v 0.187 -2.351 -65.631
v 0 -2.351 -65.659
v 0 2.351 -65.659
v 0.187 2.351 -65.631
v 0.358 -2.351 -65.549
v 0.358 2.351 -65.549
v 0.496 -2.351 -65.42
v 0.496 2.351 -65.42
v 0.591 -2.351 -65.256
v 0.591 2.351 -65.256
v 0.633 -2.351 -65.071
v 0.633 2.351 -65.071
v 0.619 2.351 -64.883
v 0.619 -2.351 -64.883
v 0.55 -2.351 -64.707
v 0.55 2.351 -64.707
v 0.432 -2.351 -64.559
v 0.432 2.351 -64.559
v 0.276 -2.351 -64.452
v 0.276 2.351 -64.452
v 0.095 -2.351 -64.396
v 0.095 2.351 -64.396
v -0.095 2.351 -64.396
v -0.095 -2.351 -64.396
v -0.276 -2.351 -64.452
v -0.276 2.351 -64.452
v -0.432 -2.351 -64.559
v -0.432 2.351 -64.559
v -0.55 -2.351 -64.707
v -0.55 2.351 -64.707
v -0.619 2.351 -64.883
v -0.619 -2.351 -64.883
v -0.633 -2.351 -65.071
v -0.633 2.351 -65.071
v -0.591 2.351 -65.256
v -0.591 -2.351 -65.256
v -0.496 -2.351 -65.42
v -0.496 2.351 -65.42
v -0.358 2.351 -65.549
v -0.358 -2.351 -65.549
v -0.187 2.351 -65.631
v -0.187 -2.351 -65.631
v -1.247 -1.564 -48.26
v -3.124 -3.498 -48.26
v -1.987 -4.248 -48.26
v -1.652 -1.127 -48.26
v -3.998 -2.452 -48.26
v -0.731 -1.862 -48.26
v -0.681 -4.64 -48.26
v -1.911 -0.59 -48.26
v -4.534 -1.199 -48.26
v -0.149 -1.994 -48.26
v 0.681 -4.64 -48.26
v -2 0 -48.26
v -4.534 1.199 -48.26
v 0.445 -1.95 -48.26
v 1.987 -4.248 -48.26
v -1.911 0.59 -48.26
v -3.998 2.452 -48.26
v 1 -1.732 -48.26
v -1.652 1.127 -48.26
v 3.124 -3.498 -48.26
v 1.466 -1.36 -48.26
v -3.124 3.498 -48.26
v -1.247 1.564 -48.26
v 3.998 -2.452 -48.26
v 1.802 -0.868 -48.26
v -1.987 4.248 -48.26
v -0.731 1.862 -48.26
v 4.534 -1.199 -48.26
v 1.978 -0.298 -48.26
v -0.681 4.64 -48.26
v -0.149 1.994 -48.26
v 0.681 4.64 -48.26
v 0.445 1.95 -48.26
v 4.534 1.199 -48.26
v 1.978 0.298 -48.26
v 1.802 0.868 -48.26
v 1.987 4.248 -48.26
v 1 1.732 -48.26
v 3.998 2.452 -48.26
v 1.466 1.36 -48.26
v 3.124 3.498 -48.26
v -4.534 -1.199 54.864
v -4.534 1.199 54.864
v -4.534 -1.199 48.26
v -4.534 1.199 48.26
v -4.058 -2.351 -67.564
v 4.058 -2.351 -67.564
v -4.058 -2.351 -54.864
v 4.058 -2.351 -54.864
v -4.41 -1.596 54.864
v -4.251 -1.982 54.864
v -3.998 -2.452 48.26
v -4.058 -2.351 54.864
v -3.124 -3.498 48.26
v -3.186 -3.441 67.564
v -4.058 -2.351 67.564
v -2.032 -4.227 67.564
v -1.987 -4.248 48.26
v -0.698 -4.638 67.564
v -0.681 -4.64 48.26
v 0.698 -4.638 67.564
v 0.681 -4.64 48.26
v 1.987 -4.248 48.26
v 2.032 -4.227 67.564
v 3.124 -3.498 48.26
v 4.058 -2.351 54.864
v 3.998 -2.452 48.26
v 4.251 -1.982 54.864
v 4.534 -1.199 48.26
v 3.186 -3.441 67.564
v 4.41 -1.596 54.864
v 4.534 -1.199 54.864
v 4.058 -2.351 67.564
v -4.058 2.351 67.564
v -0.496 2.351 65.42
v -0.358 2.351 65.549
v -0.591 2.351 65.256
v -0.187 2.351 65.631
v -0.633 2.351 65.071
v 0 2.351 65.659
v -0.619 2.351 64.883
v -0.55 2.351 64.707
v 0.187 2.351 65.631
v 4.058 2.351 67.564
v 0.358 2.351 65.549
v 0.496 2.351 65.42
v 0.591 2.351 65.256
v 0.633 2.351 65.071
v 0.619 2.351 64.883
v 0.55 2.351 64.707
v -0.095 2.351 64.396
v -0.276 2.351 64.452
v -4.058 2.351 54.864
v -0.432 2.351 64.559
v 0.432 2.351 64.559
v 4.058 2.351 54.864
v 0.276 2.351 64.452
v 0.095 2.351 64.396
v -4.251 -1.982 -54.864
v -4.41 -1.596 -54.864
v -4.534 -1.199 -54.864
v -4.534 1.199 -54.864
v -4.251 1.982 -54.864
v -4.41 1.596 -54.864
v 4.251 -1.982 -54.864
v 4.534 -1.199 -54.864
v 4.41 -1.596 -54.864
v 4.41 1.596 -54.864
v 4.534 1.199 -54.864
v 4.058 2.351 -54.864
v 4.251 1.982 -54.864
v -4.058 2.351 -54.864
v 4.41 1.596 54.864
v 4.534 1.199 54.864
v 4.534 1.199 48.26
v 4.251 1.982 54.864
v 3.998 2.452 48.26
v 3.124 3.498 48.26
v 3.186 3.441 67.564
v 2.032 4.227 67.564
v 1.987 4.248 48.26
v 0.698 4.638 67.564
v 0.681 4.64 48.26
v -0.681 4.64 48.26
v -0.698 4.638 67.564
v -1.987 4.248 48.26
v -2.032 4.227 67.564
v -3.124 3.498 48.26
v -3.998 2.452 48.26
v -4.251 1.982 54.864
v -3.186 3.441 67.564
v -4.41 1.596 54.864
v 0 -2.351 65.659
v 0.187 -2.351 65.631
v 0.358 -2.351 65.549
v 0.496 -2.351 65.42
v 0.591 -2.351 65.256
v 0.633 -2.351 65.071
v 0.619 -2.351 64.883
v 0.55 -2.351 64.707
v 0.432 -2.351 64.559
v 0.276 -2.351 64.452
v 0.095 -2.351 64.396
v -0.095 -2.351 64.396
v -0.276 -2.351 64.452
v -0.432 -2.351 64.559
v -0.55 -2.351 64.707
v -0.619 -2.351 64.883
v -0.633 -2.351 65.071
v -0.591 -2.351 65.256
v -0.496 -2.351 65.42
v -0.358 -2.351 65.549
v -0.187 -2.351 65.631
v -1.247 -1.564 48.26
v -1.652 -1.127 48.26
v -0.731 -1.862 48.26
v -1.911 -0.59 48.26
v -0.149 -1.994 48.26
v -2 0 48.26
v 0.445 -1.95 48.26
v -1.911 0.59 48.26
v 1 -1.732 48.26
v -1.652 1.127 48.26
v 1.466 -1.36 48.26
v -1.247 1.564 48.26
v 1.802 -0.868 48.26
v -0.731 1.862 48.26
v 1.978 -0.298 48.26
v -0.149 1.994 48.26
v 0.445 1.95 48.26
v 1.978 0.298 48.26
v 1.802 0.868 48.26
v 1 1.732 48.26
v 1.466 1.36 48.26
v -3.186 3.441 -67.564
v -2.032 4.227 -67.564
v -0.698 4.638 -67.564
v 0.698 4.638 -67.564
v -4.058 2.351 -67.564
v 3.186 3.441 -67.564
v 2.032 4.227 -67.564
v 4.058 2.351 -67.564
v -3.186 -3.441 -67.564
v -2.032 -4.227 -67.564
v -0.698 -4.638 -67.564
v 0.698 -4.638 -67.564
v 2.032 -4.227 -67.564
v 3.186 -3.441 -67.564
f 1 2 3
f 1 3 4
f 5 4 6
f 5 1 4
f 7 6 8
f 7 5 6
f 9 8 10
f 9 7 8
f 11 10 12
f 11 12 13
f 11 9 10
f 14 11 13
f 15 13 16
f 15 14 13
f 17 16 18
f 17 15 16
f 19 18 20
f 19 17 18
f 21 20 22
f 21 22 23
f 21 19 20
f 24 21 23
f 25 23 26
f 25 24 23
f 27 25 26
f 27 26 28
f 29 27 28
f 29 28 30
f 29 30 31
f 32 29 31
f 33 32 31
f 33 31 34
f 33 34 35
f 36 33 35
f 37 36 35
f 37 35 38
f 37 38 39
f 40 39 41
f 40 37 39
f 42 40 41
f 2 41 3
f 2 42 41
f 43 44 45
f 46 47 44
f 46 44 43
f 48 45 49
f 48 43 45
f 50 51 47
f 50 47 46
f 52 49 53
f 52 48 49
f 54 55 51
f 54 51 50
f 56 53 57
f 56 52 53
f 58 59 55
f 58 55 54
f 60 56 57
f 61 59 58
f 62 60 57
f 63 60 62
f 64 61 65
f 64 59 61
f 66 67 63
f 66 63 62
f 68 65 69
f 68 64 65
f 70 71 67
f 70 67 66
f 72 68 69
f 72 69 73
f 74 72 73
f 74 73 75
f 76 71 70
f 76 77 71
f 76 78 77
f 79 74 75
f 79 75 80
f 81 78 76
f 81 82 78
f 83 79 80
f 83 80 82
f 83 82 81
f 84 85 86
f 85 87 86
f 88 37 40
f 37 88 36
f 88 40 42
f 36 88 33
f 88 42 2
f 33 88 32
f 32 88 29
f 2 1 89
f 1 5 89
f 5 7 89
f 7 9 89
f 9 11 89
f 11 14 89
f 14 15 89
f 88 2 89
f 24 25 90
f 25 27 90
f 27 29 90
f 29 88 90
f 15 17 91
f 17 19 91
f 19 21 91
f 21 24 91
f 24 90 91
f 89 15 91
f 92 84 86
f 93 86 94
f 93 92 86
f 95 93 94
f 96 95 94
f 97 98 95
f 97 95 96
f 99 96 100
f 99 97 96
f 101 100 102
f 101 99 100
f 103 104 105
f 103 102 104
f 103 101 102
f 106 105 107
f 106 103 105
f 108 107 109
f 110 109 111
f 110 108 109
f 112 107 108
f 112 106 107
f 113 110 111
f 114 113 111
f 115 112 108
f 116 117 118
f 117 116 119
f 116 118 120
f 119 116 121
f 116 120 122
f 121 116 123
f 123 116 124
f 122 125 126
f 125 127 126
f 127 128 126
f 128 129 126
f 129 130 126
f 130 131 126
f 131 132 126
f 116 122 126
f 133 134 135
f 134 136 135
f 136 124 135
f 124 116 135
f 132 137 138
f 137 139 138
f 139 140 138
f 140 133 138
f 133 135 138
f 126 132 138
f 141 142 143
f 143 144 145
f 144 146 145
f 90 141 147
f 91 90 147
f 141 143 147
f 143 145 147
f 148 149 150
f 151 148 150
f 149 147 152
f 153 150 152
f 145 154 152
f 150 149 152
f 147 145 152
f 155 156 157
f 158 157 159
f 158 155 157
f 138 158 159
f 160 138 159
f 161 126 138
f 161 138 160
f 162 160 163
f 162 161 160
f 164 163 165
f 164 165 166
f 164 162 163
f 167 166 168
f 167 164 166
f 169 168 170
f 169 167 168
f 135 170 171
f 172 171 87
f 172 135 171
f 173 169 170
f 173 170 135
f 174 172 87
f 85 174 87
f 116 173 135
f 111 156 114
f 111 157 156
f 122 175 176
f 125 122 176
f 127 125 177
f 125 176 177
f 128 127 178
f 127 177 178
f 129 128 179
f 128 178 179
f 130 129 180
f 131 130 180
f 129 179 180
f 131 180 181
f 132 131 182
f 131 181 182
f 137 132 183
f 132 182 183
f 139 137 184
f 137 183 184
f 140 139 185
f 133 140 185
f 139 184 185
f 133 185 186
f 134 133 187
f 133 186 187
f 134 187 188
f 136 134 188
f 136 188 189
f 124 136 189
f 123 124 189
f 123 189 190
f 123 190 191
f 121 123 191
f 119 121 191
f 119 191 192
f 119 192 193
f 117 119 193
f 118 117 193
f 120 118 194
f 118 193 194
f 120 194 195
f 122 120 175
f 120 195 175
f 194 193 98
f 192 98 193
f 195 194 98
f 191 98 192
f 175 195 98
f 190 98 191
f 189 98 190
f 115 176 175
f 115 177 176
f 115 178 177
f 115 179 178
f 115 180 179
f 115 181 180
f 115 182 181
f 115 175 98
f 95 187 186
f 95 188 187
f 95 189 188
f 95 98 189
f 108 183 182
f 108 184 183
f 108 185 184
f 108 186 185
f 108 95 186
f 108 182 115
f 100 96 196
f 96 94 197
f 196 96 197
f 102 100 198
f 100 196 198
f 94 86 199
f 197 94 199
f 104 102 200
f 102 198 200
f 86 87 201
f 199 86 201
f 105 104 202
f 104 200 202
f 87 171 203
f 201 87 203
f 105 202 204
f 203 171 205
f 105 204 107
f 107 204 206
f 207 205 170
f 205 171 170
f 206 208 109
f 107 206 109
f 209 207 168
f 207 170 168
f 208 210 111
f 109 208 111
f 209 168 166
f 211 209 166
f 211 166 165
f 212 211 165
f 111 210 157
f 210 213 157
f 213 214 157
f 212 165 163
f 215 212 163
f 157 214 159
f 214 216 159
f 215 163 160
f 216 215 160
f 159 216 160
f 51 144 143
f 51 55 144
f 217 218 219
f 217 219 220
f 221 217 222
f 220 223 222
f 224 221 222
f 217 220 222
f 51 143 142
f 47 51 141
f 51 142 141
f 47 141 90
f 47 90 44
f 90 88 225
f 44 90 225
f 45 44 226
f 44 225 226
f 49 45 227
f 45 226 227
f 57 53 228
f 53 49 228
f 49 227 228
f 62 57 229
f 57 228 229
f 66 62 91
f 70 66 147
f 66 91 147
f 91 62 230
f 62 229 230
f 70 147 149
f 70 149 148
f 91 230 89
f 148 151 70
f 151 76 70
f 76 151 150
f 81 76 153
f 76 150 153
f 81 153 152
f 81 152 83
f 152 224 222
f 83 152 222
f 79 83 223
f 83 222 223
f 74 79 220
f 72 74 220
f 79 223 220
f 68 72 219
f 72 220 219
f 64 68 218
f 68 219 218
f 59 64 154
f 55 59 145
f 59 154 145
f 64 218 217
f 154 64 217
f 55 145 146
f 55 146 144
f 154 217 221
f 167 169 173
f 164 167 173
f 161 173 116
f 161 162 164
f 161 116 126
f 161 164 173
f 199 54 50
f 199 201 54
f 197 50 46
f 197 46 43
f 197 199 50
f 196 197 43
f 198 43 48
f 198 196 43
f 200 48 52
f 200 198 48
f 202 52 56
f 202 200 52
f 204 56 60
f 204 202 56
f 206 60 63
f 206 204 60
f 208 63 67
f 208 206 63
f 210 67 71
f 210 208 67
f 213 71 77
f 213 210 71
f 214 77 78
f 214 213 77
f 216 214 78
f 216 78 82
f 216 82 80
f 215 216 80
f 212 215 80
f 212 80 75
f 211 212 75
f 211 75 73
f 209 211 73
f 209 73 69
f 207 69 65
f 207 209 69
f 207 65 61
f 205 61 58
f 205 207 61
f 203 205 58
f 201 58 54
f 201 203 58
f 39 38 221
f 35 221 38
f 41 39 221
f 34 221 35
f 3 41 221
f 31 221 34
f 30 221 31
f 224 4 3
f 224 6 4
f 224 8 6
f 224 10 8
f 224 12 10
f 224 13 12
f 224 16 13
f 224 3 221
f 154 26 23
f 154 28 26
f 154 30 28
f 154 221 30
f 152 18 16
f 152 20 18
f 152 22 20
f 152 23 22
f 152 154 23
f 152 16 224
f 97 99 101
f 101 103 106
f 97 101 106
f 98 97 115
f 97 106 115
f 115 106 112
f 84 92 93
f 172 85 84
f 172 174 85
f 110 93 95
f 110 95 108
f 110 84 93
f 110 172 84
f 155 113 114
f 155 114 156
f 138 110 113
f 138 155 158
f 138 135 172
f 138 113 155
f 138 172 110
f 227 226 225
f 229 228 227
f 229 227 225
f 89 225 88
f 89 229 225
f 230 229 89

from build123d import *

# Parameters (mm, degrees)
SKETCH1_R           = 2
BOSS_EXTRUDE1_DEPTH = 48.26
SKETCH2_W           = 9.068360996
SKETCH2_H           = 9.379909118
BOSS_EXTRUDE2_DEPTH = 6.604
SKETCH3_W           = 9.068360996
SKETCH3_H           = 2.338852908
BOSS_EXTRUDE3_DEPTH = 12.7
SKETCH5_OUTSIDE_W   = 24.83
SKETCH5_OUTSIDE_H   = 25.142
SKETCH5_OUTSIDE_R   = 4.689954559
CUT_EXTRUDE2_DEPTH  = 68.878189152
SKETCH6_R           = 0.635
BOSS_EXTRUDE4_DEPTH = 4.702203303


# Read off the part's stored shape, not the designer's step: Mirror4
with BuildPart() as part:
    # Sketch1 → Boss-Extrude1 (new body)
    with BuildSketch(Plane.XY):
        with Locations(Location((0, 0, 0), (0, 0, 180))):
            Circle(SKETCH1_R)
    extrude(amount=BOSS_EXTRUDE1_DEPTH)

    # Sketch2 → Boss-Extrude2 (add)
    with BuildSketch(Plane.XY.offset(48.26)):
        Rectangle(SKETCH2_W, SKETCH2_H)
    extrude(amount=BOSS_EXTRUDE2_DEPTH)

    # Sketch3 → Boss-Extrude3 (add)
    with BuildSketch(Plane.XY.offset(54.864)):
        with Locations((0, 3.520528105)):
            Rectangle(SKETCH3_W, SKETCH3_H)
    boss_extrude3 = extrude(amount=BOSS_EXTRUDE3_DEPTH)

    # Mirror1: Boss-Extrude3 across plane
    add(boss_extrude3.mirror(Plane.ZX))

    # Sketch5 outside → Cut-Extrude2 (cut, through all)
    with BuildSketch(Plane.XY.offset(67.564)):
        Rectangle(SKETCH5_OUTSIDE_W, SKETCH5_OUTSIDE_H)
        Circle(SKETCH5_OUTSIDE_R, mode=Mode.SUBTRACT)
    extrude(amount=-CUT_EXTRUDE2_DEPTH, mode=Mode.SUBTRACT)

    # Sketch6 → Boss-Extrude4 (add)
    with BuildSketch(Plane(origin=(0, -2.351101651, 0), x_dir=(1, 0, 0), z_dir=(0, 1, 0))):
        with Locations(Location((0, -65.024, 0), (0, 0, 270))):
            Circle(SKETCH6_R)
    extrude(amount=BOSS_EXTRUDE4_DEPTH)

    # Mirror4: part across plane


with BuildPart() as part_1:
    add(part.part)
    add(part.part.mirror(Plane(origin=(0, 0, 0), x_dir=(1, 0, 0), z_dir=(0, 0, -1))))


solid = part_1.part
